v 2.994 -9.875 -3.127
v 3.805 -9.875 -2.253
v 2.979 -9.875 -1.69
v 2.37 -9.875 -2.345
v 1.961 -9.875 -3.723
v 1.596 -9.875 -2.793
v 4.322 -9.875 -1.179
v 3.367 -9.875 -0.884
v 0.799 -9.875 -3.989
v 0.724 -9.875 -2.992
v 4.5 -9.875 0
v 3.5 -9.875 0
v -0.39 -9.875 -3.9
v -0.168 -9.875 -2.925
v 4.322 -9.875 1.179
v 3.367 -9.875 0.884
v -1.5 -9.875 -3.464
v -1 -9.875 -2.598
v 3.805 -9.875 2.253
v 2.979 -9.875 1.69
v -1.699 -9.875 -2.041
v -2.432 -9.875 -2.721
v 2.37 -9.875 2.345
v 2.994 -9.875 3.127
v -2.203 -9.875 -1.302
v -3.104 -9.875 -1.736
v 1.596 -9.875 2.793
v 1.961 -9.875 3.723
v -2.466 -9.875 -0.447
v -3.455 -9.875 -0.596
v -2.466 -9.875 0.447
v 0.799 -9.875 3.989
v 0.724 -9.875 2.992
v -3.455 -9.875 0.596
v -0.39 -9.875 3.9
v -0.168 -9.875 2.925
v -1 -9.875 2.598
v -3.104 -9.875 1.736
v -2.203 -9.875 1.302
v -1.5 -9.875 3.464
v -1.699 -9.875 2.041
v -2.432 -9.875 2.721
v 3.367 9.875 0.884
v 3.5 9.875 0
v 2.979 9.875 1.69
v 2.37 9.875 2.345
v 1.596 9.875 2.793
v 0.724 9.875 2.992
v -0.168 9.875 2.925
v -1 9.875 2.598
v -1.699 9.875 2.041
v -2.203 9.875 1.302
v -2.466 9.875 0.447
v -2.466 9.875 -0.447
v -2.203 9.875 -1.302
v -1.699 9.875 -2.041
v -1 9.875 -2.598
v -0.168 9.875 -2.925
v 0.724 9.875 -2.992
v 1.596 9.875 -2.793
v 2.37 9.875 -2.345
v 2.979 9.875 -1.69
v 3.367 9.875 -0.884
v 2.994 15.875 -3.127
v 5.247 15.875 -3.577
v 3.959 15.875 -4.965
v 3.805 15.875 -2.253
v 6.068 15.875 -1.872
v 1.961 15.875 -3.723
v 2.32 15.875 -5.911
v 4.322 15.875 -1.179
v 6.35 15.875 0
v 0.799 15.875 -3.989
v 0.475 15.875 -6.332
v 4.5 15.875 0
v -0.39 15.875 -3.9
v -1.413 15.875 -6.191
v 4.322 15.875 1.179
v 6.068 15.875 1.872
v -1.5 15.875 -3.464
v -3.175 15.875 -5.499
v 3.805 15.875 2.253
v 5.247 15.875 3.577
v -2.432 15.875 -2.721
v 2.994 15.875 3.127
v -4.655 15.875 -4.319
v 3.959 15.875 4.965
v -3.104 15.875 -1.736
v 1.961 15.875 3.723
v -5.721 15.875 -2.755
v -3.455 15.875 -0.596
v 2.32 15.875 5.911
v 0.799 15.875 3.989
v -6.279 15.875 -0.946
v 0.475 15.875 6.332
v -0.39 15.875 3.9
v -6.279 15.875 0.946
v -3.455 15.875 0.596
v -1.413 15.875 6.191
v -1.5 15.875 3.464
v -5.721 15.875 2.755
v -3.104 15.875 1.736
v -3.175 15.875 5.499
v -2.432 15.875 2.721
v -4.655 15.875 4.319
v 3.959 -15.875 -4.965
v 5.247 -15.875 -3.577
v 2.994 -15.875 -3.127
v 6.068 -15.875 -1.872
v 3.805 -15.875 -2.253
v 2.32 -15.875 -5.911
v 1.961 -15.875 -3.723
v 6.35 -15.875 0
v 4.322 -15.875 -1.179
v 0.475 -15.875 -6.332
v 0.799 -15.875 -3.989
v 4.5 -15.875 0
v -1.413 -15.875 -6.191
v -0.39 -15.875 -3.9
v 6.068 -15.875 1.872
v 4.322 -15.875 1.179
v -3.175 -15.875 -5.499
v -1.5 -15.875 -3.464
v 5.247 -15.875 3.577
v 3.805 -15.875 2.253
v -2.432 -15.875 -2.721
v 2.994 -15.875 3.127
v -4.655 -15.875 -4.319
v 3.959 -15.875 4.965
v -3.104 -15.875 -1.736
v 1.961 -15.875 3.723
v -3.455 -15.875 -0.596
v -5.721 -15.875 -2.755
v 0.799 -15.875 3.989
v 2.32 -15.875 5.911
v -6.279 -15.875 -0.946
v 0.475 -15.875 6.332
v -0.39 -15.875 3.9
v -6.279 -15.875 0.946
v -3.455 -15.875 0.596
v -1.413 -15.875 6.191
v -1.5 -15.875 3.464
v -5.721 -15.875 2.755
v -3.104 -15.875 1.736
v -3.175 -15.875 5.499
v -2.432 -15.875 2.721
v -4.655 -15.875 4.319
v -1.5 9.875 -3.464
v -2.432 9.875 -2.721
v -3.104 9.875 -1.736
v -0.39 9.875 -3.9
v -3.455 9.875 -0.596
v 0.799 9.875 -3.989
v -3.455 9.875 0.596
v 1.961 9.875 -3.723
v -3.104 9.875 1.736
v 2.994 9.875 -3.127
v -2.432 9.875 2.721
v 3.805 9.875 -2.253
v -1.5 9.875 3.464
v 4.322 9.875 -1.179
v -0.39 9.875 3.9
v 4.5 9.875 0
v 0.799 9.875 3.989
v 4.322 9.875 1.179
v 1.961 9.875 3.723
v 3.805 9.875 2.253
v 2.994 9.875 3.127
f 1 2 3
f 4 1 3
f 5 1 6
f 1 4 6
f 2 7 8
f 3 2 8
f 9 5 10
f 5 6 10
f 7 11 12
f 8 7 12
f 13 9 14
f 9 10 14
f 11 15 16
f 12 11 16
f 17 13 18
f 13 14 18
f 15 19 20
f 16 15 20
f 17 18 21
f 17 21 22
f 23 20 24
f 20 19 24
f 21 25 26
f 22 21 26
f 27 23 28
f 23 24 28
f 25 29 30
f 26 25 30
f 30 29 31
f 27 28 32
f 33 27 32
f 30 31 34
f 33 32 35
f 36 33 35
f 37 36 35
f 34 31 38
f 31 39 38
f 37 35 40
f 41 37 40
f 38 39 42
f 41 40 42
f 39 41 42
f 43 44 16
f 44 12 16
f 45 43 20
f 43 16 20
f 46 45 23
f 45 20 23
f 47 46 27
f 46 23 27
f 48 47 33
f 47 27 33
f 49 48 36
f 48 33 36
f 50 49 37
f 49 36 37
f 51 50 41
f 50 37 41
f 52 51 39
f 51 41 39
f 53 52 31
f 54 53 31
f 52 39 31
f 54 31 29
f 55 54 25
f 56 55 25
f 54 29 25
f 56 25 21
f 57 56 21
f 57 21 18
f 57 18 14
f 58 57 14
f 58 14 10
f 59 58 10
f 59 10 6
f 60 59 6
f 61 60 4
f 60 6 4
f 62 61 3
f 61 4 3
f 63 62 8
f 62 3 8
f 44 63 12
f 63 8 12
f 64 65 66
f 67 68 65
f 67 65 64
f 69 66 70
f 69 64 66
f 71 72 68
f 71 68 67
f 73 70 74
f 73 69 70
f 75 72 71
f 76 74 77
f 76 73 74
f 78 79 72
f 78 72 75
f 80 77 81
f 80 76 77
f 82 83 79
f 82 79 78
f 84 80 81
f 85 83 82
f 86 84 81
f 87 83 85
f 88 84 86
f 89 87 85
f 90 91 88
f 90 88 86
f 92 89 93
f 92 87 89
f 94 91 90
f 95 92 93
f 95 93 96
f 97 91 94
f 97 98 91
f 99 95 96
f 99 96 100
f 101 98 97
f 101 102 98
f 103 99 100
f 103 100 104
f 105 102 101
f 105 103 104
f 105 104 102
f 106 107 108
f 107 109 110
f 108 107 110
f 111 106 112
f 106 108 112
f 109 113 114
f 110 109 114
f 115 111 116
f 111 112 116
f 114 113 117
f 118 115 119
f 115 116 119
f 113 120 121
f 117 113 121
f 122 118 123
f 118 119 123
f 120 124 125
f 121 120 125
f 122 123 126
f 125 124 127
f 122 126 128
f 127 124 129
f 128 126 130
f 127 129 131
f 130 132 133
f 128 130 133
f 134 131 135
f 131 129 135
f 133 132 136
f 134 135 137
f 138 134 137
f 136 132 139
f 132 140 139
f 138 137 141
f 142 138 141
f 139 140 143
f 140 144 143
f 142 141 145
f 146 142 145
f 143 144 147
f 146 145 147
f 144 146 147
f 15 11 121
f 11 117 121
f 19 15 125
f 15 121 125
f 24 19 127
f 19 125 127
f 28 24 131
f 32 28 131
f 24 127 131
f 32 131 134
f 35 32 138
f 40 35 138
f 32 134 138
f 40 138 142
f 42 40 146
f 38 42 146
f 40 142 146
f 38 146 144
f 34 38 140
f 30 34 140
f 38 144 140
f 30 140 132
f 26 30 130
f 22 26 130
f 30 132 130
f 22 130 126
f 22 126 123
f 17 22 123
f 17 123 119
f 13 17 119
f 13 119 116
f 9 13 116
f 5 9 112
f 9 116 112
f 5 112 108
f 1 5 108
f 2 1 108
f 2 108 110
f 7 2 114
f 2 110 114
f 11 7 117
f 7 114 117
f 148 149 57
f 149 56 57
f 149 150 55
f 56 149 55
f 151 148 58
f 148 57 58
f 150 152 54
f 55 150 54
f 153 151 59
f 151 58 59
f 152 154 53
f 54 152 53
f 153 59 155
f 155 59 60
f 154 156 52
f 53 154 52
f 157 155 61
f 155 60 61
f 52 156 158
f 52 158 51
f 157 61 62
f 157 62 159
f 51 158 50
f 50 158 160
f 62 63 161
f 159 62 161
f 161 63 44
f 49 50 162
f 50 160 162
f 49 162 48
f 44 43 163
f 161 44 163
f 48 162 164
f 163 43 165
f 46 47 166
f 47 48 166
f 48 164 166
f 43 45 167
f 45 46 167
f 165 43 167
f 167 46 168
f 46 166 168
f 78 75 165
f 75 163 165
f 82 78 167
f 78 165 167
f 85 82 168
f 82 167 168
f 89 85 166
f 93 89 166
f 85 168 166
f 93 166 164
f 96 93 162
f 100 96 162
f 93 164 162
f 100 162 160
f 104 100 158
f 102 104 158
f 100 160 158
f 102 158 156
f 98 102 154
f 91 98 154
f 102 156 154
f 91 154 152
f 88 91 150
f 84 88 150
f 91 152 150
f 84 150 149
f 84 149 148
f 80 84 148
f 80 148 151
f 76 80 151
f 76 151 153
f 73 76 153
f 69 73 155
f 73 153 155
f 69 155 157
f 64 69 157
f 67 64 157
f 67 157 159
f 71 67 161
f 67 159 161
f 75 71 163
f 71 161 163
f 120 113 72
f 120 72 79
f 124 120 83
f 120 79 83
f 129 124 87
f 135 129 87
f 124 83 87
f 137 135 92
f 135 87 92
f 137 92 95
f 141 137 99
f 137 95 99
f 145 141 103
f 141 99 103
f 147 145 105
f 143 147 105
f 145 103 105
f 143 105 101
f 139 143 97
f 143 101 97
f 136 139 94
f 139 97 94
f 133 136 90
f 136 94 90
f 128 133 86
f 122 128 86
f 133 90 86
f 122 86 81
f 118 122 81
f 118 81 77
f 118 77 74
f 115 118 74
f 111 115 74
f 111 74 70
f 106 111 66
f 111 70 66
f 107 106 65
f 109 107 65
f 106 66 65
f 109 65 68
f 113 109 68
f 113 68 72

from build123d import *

# Parameters (mm, degrees)
SKETCH1_W = 6.35
SKETCH1_H = 31.75


with BuildPart() as part:
    # Sketch1 → Revolve1 (revolve)
    with BuildSketch(Plane.XY):
        with Locations((3.175, 0)):
            Rectangle(SKETCH1_W, SKETCH1_H)
    revolve(axis=Axis((0, 7.563970588, 0), (0, -1, 0)))

    # Sketch2 → Cut-Revolve3 (revolve, cut)
    with BuildSketch(Plane.XY):
        Polygon((4.5, 15.875), (4.5, 9.875), (3.5, 9.875), (3.5, -9.875), (4.5, -9.875), (4.5, -15.875), (0.5, -15.875), (0.5, 15.875), align=None)
    revolve(axis=Axis((0.5, -7.982322113, 0), (0, -1, 0)), mode=Mode.SUBTRACT)


solid = part.part
